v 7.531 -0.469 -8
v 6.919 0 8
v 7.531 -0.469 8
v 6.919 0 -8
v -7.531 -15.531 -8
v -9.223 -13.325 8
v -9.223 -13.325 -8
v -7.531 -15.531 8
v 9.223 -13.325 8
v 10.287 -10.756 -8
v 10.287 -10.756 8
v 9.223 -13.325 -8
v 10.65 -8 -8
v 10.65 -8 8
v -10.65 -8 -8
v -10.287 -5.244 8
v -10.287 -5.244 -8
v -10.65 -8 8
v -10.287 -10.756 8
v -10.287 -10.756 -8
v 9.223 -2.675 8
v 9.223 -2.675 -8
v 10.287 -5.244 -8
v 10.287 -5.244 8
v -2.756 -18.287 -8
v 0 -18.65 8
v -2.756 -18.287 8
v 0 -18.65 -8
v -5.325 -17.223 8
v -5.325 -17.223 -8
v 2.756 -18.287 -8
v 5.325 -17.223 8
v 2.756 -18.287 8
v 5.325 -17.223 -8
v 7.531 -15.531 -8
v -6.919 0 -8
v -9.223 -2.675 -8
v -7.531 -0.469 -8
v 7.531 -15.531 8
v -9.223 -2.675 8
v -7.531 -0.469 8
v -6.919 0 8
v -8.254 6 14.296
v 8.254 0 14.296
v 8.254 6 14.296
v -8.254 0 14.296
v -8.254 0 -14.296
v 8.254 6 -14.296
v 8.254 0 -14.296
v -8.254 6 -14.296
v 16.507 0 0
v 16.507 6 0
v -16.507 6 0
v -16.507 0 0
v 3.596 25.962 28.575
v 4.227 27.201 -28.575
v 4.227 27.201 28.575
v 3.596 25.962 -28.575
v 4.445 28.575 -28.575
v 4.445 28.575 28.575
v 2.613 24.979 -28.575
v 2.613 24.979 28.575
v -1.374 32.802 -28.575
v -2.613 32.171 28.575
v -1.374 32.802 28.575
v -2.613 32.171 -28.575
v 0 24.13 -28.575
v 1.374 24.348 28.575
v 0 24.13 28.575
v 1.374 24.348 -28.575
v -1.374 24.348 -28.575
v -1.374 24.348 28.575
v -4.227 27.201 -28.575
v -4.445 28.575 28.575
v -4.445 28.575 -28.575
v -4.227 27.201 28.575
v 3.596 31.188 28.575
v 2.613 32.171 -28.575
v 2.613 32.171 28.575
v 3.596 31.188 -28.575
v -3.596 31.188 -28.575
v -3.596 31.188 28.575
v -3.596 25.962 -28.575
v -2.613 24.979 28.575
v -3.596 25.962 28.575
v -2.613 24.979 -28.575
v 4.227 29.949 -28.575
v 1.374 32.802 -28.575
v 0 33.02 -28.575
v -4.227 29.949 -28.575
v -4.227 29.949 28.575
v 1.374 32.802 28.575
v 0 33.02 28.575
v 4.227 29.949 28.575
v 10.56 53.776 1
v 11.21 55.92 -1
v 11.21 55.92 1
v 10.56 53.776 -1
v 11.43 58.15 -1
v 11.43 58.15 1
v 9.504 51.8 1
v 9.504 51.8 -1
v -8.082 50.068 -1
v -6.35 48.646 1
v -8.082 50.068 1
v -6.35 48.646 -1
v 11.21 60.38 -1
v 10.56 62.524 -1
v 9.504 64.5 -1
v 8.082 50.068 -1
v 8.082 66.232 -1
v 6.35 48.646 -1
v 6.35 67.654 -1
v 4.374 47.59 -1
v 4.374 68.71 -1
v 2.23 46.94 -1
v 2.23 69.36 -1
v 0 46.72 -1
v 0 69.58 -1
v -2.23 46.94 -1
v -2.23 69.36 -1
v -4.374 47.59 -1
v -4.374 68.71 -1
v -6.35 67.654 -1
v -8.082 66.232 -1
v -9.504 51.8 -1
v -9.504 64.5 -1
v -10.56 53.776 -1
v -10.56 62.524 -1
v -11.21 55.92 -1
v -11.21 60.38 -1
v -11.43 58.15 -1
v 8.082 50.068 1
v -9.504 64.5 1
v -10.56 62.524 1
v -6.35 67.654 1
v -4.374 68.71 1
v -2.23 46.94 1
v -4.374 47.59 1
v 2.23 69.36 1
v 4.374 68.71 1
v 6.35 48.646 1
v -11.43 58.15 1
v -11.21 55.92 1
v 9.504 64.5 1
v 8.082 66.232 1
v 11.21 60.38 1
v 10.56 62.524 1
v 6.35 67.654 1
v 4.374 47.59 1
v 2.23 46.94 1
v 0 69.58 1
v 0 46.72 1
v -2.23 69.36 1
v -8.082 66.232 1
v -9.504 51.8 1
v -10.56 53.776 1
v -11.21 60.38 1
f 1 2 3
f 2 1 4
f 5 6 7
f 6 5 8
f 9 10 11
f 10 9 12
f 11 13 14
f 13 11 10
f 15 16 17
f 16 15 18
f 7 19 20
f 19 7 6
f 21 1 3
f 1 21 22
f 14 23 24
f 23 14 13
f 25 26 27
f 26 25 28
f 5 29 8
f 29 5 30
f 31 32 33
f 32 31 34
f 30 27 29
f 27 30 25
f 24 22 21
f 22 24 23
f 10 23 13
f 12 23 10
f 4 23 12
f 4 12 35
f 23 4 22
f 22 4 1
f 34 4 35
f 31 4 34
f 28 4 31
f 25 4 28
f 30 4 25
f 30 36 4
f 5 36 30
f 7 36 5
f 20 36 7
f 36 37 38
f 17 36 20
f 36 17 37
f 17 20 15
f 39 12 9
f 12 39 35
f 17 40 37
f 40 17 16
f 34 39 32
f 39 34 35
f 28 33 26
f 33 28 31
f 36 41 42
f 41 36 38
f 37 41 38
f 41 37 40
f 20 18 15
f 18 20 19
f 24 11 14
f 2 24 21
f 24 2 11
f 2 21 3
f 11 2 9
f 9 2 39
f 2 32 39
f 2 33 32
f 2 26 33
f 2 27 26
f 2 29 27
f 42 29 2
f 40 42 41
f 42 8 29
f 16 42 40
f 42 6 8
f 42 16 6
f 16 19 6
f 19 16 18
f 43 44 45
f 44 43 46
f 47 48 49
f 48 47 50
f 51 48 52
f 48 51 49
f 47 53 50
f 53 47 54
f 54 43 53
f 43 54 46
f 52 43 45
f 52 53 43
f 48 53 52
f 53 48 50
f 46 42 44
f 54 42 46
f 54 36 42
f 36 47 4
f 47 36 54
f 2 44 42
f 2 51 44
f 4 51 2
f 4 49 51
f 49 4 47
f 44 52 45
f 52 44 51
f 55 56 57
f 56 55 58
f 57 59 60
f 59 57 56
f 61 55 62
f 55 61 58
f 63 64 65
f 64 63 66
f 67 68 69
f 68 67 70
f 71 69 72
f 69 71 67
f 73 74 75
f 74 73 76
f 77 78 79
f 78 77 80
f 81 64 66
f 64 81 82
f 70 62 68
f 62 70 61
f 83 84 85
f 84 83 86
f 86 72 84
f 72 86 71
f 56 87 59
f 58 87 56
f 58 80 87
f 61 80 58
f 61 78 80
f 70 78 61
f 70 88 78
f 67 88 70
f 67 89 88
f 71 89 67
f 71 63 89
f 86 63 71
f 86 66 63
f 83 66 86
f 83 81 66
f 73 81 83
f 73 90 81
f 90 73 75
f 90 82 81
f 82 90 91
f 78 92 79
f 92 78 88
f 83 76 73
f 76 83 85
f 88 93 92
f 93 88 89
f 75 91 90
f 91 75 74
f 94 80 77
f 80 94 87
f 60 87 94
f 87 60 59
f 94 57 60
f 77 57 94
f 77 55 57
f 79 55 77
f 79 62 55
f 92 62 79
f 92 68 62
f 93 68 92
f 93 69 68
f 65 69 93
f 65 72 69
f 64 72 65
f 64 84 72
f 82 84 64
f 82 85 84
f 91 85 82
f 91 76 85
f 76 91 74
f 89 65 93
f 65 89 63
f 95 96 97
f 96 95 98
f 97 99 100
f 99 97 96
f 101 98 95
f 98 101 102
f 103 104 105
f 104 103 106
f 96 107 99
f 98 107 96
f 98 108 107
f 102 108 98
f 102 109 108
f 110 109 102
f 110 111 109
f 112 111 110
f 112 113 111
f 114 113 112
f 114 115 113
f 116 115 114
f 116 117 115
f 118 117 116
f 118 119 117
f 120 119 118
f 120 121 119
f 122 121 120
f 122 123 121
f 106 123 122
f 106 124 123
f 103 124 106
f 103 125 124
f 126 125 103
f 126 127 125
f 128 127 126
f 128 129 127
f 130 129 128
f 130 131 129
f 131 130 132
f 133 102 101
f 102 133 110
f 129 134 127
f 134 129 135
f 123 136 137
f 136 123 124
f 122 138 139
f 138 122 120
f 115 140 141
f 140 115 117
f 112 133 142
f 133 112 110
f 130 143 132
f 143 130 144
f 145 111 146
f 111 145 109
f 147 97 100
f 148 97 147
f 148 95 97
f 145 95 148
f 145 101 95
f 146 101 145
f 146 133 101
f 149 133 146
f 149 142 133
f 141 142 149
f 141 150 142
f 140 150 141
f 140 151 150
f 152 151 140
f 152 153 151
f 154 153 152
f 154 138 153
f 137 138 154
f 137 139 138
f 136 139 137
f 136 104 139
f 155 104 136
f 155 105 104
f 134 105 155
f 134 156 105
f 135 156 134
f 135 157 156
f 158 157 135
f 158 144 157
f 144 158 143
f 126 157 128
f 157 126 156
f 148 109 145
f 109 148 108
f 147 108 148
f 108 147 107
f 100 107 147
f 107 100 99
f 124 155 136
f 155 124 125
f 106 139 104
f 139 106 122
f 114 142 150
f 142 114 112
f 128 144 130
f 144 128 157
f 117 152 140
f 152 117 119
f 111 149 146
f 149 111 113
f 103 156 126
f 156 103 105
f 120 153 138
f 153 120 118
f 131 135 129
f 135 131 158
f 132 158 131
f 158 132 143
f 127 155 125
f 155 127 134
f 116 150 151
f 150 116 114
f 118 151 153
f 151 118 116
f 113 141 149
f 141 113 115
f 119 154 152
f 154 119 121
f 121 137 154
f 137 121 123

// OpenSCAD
// Auto-generated by scripts/author_from_manifest.py (Phase D.3).
// Source: data/phase_d_manifest.json (sku_intent='tyco-ty3151-upright-286f').
// Do not hand-edit — regenerate from the manifest.
//
// @part tyco_ty3151_upright_286f
// @kind sprinkler_head
// @category head.upright.k56
// @display-name "Tyco TY3151 Upright K5.6 SR 286°F"
// @mfg tyco_fire_protection
// @mfg-pn TY3151
// @listing UL FM
// @hazard-classes LH OH1
// @price-usd 13.80
// @install-minutes 8
// @crew journeyman
// @k-factor 5.6
// @orientation upright
// @response standard
// @temperature 286F
// @param size_in number default=0.5 label="Size" unit="in"
// @port inlet position=[0,0.014,0] direction=[0,1,0] style=NPT_threaded size_in=0.5 role=drop

size_in = 0.5;
k_factor = 5.6;

length_mm   = 57.15;
body_dia_mm = 25.40;
thread_od   = 21.3;
thread_len  = 16;
deflector_d = body_dia_mm * 0.9;

rotate([180,0,0]) union() {
    translate([0, thread_len/2, 0])
        cylinder(h = thread_len, d = thread_od, center = true, $fn = 24);
    translate([0, -3, 0])
        rotate([90, 0, 0])
        cylinder(h = 6, d = thread_od * 1.55, $fn = 6, center = true);
    translate([0, -length_mm/2, 0])
        cylinder(h = length_mm, d = body_dia_mm * 0.35, center = true, $fn = 20);
    translate([0, -length_mm - 1, 0])
        cylinder(h = 2, d = deflector_d, center = true, $fn = 32);
}
